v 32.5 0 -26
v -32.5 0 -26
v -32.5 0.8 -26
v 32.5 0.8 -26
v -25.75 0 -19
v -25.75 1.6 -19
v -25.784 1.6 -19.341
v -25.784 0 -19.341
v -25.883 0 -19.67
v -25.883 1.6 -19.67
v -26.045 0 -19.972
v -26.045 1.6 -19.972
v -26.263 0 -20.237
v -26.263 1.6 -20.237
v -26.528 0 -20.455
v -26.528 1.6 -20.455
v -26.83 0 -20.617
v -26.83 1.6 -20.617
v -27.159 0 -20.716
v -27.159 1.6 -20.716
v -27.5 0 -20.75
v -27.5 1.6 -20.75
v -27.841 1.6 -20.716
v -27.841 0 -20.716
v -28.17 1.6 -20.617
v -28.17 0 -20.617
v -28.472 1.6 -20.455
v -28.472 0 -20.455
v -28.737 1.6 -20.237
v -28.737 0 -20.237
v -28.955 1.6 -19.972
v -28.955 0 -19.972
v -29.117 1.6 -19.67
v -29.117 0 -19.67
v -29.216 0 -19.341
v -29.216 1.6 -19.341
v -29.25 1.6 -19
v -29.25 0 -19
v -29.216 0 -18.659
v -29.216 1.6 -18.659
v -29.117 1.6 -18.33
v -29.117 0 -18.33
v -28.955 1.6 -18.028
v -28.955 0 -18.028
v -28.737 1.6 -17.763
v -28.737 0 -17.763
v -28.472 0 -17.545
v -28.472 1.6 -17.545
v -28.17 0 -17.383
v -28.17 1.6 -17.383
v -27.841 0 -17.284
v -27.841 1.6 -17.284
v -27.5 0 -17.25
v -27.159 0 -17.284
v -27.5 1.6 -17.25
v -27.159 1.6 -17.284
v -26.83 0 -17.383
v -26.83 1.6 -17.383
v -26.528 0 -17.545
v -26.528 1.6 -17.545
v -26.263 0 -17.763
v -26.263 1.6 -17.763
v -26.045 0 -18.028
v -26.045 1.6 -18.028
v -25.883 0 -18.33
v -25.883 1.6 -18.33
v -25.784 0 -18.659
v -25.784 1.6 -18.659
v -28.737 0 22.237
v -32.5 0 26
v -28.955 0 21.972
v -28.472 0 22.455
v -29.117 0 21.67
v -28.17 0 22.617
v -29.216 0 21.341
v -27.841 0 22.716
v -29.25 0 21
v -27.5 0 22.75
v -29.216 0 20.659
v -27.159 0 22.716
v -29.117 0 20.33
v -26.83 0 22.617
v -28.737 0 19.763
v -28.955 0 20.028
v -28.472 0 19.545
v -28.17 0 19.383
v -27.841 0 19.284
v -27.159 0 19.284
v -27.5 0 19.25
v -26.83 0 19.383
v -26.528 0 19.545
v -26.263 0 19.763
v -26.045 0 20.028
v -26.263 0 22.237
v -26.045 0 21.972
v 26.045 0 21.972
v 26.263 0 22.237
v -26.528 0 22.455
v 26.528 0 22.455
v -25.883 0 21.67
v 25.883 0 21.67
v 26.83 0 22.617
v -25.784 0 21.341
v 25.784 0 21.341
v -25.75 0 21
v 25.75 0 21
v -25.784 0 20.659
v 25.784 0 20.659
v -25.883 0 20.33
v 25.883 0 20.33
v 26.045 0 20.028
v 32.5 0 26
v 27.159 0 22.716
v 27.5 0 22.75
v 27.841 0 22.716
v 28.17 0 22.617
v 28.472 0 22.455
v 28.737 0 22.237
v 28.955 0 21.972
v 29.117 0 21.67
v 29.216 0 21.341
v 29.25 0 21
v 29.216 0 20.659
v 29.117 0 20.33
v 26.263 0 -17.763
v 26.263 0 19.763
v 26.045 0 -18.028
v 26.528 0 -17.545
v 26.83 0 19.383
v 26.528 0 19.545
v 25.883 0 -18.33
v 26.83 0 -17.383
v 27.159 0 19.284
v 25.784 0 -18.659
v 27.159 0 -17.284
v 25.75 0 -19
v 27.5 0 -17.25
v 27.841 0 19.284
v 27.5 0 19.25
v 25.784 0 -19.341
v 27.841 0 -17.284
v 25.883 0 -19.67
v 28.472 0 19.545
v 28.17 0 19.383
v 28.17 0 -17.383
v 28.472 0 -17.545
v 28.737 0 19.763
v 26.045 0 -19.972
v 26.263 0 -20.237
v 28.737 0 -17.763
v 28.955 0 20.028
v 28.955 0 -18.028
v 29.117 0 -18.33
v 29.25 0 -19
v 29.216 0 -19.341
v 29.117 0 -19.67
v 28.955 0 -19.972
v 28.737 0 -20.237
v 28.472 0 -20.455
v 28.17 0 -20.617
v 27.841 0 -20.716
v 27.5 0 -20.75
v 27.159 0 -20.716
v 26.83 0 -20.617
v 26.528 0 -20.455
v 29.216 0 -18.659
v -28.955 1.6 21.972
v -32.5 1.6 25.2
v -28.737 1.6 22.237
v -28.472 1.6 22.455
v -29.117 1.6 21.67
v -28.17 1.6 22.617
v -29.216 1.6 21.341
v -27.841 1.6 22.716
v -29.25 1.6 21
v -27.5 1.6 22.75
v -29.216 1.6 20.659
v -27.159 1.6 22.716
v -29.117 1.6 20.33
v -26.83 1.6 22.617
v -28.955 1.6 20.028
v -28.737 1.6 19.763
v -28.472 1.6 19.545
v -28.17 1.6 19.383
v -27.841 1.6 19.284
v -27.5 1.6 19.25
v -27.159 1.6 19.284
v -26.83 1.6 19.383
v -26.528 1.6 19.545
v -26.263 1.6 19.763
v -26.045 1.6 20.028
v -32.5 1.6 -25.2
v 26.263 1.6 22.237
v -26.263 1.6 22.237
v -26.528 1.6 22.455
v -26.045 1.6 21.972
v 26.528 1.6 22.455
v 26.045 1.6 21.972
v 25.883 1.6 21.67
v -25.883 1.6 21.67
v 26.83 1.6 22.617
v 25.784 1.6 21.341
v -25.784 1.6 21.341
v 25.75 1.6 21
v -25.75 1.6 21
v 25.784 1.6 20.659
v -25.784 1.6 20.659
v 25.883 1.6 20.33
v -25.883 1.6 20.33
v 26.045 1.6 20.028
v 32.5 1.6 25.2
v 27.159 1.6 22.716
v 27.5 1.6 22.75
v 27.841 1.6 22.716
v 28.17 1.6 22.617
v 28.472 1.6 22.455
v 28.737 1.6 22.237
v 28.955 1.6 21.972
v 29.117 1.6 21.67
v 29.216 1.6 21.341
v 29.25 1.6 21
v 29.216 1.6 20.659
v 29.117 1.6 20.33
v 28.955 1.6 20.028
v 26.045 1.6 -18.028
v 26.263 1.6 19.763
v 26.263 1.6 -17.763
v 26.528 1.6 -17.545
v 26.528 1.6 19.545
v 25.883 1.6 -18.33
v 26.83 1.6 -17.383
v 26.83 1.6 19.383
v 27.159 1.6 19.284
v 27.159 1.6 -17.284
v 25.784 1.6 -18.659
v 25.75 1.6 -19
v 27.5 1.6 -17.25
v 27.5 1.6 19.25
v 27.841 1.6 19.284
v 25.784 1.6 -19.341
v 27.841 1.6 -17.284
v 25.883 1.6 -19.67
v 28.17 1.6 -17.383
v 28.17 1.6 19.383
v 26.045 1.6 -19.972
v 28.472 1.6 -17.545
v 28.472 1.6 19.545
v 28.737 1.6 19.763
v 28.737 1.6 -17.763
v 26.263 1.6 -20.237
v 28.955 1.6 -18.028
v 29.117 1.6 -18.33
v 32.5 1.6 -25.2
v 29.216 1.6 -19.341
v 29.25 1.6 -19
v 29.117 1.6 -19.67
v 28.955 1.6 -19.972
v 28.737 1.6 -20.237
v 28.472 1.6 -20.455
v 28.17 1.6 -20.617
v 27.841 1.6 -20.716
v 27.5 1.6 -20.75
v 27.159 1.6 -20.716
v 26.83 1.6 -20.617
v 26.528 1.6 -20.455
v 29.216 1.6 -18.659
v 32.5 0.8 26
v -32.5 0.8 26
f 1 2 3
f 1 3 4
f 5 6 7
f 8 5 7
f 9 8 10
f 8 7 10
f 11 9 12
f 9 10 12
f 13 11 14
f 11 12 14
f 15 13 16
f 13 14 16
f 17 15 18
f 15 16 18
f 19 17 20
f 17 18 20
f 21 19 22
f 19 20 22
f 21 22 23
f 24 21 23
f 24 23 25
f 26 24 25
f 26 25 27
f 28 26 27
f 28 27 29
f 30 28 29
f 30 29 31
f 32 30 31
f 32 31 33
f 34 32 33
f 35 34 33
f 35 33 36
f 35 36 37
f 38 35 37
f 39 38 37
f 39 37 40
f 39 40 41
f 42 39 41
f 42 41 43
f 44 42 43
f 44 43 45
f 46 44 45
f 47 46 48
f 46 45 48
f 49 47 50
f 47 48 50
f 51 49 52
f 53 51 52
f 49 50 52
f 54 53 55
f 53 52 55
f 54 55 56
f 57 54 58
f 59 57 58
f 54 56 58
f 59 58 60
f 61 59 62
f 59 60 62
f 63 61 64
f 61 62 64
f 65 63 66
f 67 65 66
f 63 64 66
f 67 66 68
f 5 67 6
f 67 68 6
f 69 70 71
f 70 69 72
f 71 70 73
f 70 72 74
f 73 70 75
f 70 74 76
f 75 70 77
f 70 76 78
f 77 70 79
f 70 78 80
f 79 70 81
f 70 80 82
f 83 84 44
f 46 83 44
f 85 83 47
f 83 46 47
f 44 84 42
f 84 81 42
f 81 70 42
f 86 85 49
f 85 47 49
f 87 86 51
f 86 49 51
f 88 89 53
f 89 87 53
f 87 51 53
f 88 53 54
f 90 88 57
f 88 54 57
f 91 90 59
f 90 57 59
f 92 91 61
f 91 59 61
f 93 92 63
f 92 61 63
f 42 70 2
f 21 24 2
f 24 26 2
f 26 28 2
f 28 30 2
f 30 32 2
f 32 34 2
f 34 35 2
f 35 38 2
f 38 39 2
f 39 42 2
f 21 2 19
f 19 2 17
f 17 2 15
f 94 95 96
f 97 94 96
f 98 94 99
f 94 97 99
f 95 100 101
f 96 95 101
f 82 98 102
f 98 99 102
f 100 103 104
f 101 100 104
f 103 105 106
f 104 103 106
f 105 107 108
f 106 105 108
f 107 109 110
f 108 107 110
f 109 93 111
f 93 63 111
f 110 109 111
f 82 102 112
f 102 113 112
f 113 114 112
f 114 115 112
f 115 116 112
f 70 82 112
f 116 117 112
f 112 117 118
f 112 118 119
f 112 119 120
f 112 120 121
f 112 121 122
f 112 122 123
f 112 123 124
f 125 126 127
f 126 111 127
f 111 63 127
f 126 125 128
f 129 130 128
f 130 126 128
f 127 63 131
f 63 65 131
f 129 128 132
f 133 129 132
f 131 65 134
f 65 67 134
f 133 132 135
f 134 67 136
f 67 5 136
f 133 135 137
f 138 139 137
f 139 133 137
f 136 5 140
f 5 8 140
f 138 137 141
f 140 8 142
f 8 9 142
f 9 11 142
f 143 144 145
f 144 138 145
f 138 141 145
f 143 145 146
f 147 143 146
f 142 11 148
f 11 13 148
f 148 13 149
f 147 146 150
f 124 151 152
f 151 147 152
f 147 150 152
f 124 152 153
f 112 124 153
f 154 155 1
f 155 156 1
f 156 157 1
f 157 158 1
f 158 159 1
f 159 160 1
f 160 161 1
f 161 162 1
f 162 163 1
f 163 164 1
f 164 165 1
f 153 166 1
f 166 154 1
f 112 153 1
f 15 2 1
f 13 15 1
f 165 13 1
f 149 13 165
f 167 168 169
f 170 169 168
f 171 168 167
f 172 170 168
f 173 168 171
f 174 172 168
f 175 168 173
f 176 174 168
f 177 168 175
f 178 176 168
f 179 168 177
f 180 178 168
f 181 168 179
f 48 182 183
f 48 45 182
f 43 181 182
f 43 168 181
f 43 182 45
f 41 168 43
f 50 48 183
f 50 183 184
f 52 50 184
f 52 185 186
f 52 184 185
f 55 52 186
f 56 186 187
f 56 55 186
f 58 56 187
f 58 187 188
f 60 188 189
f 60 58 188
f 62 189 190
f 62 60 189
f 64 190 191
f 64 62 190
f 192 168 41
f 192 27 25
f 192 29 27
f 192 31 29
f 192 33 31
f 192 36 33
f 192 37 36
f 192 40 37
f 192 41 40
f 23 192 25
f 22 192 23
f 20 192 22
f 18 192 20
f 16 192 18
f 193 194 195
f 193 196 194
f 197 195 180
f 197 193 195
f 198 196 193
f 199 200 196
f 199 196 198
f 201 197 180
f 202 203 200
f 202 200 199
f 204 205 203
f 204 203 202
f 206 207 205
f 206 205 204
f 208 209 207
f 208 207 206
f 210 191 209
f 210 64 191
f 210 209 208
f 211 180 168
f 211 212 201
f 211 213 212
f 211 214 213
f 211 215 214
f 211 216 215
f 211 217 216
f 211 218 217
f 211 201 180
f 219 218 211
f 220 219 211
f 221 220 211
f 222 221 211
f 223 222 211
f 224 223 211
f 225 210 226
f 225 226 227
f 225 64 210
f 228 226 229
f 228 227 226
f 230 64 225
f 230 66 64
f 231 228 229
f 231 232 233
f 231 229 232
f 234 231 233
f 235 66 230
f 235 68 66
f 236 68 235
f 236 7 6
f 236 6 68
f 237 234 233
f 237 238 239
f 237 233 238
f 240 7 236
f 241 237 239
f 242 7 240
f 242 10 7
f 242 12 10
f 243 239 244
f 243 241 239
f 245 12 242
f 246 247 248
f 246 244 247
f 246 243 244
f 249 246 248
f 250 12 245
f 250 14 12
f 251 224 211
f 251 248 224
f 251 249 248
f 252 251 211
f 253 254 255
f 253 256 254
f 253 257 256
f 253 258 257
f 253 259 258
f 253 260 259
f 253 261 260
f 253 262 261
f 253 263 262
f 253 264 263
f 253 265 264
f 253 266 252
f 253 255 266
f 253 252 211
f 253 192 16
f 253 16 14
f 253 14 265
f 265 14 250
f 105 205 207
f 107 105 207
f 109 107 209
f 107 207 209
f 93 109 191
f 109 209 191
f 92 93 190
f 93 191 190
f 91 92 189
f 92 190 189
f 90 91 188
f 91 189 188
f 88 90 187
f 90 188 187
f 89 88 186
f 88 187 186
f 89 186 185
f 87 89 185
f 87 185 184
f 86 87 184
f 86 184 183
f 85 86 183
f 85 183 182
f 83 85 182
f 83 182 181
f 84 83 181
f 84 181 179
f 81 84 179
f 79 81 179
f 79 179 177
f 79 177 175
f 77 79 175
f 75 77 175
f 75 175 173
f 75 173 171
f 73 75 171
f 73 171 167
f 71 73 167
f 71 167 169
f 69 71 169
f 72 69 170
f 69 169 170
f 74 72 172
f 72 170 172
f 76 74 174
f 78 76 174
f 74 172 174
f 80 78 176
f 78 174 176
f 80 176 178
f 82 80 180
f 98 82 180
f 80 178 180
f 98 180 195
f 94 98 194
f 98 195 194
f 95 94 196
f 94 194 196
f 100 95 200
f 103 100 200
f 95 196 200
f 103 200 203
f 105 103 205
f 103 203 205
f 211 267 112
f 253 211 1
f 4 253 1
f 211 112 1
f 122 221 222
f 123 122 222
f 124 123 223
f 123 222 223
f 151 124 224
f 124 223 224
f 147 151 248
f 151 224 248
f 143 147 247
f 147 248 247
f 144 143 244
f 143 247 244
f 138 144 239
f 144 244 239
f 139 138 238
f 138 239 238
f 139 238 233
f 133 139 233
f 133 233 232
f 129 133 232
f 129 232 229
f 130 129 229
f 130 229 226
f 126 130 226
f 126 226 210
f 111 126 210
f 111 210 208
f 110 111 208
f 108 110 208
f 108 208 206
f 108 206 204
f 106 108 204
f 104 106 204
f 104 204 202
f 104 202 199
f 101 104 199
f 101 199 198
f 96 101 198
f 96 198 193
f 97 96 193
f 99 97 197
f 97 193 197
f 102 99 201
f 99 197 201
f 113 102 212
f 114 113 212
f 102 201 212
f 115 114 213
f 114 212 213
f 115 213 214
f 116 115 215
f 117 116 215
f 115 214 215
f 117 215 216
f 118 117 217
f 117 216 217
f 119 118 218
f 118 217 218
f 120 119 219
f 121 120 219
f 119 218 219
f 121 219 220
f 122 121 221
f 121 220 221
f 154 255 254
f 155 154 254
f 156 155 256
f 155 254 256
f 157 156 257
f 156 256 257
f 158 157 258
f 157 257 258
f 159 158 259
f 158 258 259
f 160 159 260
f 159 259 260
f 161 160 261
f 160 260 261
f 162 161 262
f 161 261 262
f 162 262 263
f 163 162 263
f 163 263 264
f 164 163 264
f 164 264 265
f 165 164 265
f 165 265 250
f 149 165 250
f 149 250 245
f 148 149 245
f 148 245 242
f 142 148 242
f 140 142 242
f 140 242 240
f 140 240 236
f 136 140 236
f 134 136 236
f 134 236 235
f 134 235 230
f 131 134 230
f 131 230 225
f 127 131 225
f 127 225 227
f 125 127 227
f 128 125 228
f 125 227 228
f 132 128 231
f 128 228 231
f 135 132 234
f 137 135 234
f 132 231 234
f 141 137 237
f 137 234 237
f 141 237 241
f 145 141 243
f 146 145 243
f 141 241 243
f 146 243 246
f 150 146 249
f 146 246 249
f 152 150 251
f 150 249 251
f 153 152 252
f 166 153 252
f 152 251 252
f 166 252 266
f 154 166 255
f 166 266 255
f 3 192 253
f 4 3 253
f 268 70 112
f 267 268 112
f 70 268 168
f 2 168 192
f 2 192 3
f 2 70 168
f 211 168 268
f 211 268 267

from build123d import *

# Parameters (mm, degrees)
SKETCH1_W           = 65
SKETCH1_H           = 52
BOSS_EXTRUDE1_DEPTH = 1.6
SKETCH2_R           = 1.75
CUT_EXTRUDE1_DEPTH  = 2.6
CHAMFER1_SIZE       = 0.8


with BuildPart() as part:
    # Sketch1 → Boss-Extrude1 (new body)
    with BuildSketch(Plane(origin=(0, 0, 0), x_dir=(1, 0, 0), z_dir=(0, 1, 0))):
        Rectangle(SKETCH1_W, SKETCH1_H)
    extrude(amount=BOSS_EXTRUDE1_DEPTH)

    # Sketch2 → Cut-Extrude1 (cut, through all)
    with BuildSketch(Plane(origin=(0, 1.6, 0), x_dir=(1, 0, 0), z_dir=(0, 1, 0))):
        with Locations((-27.5, -21)):
            Circle(SKETCH2_R)
        with Locations((-27.5, 19)):
            Circle(SKETCH2_R)
        with Locations((27.5, 19)):
            Circle(SKETCH2_R)
        with Locations((27.5, -21)):
            Circle(SKETCH2_R)
    extrude(amount=-CUT_EXTRUDE1_DEPTH, mode=Mode.SUBTRACT)

    # Chamfer1
    chamfer1_edges = [part.edges().sort_by_distance(p)[0] for p in [
        (0, 1.6, 26),
        (0, 1.6, -26),
    ]]
    chamfer(chamfer1_edges, length=CHAMFER1_SIZE)


solid = part.part
